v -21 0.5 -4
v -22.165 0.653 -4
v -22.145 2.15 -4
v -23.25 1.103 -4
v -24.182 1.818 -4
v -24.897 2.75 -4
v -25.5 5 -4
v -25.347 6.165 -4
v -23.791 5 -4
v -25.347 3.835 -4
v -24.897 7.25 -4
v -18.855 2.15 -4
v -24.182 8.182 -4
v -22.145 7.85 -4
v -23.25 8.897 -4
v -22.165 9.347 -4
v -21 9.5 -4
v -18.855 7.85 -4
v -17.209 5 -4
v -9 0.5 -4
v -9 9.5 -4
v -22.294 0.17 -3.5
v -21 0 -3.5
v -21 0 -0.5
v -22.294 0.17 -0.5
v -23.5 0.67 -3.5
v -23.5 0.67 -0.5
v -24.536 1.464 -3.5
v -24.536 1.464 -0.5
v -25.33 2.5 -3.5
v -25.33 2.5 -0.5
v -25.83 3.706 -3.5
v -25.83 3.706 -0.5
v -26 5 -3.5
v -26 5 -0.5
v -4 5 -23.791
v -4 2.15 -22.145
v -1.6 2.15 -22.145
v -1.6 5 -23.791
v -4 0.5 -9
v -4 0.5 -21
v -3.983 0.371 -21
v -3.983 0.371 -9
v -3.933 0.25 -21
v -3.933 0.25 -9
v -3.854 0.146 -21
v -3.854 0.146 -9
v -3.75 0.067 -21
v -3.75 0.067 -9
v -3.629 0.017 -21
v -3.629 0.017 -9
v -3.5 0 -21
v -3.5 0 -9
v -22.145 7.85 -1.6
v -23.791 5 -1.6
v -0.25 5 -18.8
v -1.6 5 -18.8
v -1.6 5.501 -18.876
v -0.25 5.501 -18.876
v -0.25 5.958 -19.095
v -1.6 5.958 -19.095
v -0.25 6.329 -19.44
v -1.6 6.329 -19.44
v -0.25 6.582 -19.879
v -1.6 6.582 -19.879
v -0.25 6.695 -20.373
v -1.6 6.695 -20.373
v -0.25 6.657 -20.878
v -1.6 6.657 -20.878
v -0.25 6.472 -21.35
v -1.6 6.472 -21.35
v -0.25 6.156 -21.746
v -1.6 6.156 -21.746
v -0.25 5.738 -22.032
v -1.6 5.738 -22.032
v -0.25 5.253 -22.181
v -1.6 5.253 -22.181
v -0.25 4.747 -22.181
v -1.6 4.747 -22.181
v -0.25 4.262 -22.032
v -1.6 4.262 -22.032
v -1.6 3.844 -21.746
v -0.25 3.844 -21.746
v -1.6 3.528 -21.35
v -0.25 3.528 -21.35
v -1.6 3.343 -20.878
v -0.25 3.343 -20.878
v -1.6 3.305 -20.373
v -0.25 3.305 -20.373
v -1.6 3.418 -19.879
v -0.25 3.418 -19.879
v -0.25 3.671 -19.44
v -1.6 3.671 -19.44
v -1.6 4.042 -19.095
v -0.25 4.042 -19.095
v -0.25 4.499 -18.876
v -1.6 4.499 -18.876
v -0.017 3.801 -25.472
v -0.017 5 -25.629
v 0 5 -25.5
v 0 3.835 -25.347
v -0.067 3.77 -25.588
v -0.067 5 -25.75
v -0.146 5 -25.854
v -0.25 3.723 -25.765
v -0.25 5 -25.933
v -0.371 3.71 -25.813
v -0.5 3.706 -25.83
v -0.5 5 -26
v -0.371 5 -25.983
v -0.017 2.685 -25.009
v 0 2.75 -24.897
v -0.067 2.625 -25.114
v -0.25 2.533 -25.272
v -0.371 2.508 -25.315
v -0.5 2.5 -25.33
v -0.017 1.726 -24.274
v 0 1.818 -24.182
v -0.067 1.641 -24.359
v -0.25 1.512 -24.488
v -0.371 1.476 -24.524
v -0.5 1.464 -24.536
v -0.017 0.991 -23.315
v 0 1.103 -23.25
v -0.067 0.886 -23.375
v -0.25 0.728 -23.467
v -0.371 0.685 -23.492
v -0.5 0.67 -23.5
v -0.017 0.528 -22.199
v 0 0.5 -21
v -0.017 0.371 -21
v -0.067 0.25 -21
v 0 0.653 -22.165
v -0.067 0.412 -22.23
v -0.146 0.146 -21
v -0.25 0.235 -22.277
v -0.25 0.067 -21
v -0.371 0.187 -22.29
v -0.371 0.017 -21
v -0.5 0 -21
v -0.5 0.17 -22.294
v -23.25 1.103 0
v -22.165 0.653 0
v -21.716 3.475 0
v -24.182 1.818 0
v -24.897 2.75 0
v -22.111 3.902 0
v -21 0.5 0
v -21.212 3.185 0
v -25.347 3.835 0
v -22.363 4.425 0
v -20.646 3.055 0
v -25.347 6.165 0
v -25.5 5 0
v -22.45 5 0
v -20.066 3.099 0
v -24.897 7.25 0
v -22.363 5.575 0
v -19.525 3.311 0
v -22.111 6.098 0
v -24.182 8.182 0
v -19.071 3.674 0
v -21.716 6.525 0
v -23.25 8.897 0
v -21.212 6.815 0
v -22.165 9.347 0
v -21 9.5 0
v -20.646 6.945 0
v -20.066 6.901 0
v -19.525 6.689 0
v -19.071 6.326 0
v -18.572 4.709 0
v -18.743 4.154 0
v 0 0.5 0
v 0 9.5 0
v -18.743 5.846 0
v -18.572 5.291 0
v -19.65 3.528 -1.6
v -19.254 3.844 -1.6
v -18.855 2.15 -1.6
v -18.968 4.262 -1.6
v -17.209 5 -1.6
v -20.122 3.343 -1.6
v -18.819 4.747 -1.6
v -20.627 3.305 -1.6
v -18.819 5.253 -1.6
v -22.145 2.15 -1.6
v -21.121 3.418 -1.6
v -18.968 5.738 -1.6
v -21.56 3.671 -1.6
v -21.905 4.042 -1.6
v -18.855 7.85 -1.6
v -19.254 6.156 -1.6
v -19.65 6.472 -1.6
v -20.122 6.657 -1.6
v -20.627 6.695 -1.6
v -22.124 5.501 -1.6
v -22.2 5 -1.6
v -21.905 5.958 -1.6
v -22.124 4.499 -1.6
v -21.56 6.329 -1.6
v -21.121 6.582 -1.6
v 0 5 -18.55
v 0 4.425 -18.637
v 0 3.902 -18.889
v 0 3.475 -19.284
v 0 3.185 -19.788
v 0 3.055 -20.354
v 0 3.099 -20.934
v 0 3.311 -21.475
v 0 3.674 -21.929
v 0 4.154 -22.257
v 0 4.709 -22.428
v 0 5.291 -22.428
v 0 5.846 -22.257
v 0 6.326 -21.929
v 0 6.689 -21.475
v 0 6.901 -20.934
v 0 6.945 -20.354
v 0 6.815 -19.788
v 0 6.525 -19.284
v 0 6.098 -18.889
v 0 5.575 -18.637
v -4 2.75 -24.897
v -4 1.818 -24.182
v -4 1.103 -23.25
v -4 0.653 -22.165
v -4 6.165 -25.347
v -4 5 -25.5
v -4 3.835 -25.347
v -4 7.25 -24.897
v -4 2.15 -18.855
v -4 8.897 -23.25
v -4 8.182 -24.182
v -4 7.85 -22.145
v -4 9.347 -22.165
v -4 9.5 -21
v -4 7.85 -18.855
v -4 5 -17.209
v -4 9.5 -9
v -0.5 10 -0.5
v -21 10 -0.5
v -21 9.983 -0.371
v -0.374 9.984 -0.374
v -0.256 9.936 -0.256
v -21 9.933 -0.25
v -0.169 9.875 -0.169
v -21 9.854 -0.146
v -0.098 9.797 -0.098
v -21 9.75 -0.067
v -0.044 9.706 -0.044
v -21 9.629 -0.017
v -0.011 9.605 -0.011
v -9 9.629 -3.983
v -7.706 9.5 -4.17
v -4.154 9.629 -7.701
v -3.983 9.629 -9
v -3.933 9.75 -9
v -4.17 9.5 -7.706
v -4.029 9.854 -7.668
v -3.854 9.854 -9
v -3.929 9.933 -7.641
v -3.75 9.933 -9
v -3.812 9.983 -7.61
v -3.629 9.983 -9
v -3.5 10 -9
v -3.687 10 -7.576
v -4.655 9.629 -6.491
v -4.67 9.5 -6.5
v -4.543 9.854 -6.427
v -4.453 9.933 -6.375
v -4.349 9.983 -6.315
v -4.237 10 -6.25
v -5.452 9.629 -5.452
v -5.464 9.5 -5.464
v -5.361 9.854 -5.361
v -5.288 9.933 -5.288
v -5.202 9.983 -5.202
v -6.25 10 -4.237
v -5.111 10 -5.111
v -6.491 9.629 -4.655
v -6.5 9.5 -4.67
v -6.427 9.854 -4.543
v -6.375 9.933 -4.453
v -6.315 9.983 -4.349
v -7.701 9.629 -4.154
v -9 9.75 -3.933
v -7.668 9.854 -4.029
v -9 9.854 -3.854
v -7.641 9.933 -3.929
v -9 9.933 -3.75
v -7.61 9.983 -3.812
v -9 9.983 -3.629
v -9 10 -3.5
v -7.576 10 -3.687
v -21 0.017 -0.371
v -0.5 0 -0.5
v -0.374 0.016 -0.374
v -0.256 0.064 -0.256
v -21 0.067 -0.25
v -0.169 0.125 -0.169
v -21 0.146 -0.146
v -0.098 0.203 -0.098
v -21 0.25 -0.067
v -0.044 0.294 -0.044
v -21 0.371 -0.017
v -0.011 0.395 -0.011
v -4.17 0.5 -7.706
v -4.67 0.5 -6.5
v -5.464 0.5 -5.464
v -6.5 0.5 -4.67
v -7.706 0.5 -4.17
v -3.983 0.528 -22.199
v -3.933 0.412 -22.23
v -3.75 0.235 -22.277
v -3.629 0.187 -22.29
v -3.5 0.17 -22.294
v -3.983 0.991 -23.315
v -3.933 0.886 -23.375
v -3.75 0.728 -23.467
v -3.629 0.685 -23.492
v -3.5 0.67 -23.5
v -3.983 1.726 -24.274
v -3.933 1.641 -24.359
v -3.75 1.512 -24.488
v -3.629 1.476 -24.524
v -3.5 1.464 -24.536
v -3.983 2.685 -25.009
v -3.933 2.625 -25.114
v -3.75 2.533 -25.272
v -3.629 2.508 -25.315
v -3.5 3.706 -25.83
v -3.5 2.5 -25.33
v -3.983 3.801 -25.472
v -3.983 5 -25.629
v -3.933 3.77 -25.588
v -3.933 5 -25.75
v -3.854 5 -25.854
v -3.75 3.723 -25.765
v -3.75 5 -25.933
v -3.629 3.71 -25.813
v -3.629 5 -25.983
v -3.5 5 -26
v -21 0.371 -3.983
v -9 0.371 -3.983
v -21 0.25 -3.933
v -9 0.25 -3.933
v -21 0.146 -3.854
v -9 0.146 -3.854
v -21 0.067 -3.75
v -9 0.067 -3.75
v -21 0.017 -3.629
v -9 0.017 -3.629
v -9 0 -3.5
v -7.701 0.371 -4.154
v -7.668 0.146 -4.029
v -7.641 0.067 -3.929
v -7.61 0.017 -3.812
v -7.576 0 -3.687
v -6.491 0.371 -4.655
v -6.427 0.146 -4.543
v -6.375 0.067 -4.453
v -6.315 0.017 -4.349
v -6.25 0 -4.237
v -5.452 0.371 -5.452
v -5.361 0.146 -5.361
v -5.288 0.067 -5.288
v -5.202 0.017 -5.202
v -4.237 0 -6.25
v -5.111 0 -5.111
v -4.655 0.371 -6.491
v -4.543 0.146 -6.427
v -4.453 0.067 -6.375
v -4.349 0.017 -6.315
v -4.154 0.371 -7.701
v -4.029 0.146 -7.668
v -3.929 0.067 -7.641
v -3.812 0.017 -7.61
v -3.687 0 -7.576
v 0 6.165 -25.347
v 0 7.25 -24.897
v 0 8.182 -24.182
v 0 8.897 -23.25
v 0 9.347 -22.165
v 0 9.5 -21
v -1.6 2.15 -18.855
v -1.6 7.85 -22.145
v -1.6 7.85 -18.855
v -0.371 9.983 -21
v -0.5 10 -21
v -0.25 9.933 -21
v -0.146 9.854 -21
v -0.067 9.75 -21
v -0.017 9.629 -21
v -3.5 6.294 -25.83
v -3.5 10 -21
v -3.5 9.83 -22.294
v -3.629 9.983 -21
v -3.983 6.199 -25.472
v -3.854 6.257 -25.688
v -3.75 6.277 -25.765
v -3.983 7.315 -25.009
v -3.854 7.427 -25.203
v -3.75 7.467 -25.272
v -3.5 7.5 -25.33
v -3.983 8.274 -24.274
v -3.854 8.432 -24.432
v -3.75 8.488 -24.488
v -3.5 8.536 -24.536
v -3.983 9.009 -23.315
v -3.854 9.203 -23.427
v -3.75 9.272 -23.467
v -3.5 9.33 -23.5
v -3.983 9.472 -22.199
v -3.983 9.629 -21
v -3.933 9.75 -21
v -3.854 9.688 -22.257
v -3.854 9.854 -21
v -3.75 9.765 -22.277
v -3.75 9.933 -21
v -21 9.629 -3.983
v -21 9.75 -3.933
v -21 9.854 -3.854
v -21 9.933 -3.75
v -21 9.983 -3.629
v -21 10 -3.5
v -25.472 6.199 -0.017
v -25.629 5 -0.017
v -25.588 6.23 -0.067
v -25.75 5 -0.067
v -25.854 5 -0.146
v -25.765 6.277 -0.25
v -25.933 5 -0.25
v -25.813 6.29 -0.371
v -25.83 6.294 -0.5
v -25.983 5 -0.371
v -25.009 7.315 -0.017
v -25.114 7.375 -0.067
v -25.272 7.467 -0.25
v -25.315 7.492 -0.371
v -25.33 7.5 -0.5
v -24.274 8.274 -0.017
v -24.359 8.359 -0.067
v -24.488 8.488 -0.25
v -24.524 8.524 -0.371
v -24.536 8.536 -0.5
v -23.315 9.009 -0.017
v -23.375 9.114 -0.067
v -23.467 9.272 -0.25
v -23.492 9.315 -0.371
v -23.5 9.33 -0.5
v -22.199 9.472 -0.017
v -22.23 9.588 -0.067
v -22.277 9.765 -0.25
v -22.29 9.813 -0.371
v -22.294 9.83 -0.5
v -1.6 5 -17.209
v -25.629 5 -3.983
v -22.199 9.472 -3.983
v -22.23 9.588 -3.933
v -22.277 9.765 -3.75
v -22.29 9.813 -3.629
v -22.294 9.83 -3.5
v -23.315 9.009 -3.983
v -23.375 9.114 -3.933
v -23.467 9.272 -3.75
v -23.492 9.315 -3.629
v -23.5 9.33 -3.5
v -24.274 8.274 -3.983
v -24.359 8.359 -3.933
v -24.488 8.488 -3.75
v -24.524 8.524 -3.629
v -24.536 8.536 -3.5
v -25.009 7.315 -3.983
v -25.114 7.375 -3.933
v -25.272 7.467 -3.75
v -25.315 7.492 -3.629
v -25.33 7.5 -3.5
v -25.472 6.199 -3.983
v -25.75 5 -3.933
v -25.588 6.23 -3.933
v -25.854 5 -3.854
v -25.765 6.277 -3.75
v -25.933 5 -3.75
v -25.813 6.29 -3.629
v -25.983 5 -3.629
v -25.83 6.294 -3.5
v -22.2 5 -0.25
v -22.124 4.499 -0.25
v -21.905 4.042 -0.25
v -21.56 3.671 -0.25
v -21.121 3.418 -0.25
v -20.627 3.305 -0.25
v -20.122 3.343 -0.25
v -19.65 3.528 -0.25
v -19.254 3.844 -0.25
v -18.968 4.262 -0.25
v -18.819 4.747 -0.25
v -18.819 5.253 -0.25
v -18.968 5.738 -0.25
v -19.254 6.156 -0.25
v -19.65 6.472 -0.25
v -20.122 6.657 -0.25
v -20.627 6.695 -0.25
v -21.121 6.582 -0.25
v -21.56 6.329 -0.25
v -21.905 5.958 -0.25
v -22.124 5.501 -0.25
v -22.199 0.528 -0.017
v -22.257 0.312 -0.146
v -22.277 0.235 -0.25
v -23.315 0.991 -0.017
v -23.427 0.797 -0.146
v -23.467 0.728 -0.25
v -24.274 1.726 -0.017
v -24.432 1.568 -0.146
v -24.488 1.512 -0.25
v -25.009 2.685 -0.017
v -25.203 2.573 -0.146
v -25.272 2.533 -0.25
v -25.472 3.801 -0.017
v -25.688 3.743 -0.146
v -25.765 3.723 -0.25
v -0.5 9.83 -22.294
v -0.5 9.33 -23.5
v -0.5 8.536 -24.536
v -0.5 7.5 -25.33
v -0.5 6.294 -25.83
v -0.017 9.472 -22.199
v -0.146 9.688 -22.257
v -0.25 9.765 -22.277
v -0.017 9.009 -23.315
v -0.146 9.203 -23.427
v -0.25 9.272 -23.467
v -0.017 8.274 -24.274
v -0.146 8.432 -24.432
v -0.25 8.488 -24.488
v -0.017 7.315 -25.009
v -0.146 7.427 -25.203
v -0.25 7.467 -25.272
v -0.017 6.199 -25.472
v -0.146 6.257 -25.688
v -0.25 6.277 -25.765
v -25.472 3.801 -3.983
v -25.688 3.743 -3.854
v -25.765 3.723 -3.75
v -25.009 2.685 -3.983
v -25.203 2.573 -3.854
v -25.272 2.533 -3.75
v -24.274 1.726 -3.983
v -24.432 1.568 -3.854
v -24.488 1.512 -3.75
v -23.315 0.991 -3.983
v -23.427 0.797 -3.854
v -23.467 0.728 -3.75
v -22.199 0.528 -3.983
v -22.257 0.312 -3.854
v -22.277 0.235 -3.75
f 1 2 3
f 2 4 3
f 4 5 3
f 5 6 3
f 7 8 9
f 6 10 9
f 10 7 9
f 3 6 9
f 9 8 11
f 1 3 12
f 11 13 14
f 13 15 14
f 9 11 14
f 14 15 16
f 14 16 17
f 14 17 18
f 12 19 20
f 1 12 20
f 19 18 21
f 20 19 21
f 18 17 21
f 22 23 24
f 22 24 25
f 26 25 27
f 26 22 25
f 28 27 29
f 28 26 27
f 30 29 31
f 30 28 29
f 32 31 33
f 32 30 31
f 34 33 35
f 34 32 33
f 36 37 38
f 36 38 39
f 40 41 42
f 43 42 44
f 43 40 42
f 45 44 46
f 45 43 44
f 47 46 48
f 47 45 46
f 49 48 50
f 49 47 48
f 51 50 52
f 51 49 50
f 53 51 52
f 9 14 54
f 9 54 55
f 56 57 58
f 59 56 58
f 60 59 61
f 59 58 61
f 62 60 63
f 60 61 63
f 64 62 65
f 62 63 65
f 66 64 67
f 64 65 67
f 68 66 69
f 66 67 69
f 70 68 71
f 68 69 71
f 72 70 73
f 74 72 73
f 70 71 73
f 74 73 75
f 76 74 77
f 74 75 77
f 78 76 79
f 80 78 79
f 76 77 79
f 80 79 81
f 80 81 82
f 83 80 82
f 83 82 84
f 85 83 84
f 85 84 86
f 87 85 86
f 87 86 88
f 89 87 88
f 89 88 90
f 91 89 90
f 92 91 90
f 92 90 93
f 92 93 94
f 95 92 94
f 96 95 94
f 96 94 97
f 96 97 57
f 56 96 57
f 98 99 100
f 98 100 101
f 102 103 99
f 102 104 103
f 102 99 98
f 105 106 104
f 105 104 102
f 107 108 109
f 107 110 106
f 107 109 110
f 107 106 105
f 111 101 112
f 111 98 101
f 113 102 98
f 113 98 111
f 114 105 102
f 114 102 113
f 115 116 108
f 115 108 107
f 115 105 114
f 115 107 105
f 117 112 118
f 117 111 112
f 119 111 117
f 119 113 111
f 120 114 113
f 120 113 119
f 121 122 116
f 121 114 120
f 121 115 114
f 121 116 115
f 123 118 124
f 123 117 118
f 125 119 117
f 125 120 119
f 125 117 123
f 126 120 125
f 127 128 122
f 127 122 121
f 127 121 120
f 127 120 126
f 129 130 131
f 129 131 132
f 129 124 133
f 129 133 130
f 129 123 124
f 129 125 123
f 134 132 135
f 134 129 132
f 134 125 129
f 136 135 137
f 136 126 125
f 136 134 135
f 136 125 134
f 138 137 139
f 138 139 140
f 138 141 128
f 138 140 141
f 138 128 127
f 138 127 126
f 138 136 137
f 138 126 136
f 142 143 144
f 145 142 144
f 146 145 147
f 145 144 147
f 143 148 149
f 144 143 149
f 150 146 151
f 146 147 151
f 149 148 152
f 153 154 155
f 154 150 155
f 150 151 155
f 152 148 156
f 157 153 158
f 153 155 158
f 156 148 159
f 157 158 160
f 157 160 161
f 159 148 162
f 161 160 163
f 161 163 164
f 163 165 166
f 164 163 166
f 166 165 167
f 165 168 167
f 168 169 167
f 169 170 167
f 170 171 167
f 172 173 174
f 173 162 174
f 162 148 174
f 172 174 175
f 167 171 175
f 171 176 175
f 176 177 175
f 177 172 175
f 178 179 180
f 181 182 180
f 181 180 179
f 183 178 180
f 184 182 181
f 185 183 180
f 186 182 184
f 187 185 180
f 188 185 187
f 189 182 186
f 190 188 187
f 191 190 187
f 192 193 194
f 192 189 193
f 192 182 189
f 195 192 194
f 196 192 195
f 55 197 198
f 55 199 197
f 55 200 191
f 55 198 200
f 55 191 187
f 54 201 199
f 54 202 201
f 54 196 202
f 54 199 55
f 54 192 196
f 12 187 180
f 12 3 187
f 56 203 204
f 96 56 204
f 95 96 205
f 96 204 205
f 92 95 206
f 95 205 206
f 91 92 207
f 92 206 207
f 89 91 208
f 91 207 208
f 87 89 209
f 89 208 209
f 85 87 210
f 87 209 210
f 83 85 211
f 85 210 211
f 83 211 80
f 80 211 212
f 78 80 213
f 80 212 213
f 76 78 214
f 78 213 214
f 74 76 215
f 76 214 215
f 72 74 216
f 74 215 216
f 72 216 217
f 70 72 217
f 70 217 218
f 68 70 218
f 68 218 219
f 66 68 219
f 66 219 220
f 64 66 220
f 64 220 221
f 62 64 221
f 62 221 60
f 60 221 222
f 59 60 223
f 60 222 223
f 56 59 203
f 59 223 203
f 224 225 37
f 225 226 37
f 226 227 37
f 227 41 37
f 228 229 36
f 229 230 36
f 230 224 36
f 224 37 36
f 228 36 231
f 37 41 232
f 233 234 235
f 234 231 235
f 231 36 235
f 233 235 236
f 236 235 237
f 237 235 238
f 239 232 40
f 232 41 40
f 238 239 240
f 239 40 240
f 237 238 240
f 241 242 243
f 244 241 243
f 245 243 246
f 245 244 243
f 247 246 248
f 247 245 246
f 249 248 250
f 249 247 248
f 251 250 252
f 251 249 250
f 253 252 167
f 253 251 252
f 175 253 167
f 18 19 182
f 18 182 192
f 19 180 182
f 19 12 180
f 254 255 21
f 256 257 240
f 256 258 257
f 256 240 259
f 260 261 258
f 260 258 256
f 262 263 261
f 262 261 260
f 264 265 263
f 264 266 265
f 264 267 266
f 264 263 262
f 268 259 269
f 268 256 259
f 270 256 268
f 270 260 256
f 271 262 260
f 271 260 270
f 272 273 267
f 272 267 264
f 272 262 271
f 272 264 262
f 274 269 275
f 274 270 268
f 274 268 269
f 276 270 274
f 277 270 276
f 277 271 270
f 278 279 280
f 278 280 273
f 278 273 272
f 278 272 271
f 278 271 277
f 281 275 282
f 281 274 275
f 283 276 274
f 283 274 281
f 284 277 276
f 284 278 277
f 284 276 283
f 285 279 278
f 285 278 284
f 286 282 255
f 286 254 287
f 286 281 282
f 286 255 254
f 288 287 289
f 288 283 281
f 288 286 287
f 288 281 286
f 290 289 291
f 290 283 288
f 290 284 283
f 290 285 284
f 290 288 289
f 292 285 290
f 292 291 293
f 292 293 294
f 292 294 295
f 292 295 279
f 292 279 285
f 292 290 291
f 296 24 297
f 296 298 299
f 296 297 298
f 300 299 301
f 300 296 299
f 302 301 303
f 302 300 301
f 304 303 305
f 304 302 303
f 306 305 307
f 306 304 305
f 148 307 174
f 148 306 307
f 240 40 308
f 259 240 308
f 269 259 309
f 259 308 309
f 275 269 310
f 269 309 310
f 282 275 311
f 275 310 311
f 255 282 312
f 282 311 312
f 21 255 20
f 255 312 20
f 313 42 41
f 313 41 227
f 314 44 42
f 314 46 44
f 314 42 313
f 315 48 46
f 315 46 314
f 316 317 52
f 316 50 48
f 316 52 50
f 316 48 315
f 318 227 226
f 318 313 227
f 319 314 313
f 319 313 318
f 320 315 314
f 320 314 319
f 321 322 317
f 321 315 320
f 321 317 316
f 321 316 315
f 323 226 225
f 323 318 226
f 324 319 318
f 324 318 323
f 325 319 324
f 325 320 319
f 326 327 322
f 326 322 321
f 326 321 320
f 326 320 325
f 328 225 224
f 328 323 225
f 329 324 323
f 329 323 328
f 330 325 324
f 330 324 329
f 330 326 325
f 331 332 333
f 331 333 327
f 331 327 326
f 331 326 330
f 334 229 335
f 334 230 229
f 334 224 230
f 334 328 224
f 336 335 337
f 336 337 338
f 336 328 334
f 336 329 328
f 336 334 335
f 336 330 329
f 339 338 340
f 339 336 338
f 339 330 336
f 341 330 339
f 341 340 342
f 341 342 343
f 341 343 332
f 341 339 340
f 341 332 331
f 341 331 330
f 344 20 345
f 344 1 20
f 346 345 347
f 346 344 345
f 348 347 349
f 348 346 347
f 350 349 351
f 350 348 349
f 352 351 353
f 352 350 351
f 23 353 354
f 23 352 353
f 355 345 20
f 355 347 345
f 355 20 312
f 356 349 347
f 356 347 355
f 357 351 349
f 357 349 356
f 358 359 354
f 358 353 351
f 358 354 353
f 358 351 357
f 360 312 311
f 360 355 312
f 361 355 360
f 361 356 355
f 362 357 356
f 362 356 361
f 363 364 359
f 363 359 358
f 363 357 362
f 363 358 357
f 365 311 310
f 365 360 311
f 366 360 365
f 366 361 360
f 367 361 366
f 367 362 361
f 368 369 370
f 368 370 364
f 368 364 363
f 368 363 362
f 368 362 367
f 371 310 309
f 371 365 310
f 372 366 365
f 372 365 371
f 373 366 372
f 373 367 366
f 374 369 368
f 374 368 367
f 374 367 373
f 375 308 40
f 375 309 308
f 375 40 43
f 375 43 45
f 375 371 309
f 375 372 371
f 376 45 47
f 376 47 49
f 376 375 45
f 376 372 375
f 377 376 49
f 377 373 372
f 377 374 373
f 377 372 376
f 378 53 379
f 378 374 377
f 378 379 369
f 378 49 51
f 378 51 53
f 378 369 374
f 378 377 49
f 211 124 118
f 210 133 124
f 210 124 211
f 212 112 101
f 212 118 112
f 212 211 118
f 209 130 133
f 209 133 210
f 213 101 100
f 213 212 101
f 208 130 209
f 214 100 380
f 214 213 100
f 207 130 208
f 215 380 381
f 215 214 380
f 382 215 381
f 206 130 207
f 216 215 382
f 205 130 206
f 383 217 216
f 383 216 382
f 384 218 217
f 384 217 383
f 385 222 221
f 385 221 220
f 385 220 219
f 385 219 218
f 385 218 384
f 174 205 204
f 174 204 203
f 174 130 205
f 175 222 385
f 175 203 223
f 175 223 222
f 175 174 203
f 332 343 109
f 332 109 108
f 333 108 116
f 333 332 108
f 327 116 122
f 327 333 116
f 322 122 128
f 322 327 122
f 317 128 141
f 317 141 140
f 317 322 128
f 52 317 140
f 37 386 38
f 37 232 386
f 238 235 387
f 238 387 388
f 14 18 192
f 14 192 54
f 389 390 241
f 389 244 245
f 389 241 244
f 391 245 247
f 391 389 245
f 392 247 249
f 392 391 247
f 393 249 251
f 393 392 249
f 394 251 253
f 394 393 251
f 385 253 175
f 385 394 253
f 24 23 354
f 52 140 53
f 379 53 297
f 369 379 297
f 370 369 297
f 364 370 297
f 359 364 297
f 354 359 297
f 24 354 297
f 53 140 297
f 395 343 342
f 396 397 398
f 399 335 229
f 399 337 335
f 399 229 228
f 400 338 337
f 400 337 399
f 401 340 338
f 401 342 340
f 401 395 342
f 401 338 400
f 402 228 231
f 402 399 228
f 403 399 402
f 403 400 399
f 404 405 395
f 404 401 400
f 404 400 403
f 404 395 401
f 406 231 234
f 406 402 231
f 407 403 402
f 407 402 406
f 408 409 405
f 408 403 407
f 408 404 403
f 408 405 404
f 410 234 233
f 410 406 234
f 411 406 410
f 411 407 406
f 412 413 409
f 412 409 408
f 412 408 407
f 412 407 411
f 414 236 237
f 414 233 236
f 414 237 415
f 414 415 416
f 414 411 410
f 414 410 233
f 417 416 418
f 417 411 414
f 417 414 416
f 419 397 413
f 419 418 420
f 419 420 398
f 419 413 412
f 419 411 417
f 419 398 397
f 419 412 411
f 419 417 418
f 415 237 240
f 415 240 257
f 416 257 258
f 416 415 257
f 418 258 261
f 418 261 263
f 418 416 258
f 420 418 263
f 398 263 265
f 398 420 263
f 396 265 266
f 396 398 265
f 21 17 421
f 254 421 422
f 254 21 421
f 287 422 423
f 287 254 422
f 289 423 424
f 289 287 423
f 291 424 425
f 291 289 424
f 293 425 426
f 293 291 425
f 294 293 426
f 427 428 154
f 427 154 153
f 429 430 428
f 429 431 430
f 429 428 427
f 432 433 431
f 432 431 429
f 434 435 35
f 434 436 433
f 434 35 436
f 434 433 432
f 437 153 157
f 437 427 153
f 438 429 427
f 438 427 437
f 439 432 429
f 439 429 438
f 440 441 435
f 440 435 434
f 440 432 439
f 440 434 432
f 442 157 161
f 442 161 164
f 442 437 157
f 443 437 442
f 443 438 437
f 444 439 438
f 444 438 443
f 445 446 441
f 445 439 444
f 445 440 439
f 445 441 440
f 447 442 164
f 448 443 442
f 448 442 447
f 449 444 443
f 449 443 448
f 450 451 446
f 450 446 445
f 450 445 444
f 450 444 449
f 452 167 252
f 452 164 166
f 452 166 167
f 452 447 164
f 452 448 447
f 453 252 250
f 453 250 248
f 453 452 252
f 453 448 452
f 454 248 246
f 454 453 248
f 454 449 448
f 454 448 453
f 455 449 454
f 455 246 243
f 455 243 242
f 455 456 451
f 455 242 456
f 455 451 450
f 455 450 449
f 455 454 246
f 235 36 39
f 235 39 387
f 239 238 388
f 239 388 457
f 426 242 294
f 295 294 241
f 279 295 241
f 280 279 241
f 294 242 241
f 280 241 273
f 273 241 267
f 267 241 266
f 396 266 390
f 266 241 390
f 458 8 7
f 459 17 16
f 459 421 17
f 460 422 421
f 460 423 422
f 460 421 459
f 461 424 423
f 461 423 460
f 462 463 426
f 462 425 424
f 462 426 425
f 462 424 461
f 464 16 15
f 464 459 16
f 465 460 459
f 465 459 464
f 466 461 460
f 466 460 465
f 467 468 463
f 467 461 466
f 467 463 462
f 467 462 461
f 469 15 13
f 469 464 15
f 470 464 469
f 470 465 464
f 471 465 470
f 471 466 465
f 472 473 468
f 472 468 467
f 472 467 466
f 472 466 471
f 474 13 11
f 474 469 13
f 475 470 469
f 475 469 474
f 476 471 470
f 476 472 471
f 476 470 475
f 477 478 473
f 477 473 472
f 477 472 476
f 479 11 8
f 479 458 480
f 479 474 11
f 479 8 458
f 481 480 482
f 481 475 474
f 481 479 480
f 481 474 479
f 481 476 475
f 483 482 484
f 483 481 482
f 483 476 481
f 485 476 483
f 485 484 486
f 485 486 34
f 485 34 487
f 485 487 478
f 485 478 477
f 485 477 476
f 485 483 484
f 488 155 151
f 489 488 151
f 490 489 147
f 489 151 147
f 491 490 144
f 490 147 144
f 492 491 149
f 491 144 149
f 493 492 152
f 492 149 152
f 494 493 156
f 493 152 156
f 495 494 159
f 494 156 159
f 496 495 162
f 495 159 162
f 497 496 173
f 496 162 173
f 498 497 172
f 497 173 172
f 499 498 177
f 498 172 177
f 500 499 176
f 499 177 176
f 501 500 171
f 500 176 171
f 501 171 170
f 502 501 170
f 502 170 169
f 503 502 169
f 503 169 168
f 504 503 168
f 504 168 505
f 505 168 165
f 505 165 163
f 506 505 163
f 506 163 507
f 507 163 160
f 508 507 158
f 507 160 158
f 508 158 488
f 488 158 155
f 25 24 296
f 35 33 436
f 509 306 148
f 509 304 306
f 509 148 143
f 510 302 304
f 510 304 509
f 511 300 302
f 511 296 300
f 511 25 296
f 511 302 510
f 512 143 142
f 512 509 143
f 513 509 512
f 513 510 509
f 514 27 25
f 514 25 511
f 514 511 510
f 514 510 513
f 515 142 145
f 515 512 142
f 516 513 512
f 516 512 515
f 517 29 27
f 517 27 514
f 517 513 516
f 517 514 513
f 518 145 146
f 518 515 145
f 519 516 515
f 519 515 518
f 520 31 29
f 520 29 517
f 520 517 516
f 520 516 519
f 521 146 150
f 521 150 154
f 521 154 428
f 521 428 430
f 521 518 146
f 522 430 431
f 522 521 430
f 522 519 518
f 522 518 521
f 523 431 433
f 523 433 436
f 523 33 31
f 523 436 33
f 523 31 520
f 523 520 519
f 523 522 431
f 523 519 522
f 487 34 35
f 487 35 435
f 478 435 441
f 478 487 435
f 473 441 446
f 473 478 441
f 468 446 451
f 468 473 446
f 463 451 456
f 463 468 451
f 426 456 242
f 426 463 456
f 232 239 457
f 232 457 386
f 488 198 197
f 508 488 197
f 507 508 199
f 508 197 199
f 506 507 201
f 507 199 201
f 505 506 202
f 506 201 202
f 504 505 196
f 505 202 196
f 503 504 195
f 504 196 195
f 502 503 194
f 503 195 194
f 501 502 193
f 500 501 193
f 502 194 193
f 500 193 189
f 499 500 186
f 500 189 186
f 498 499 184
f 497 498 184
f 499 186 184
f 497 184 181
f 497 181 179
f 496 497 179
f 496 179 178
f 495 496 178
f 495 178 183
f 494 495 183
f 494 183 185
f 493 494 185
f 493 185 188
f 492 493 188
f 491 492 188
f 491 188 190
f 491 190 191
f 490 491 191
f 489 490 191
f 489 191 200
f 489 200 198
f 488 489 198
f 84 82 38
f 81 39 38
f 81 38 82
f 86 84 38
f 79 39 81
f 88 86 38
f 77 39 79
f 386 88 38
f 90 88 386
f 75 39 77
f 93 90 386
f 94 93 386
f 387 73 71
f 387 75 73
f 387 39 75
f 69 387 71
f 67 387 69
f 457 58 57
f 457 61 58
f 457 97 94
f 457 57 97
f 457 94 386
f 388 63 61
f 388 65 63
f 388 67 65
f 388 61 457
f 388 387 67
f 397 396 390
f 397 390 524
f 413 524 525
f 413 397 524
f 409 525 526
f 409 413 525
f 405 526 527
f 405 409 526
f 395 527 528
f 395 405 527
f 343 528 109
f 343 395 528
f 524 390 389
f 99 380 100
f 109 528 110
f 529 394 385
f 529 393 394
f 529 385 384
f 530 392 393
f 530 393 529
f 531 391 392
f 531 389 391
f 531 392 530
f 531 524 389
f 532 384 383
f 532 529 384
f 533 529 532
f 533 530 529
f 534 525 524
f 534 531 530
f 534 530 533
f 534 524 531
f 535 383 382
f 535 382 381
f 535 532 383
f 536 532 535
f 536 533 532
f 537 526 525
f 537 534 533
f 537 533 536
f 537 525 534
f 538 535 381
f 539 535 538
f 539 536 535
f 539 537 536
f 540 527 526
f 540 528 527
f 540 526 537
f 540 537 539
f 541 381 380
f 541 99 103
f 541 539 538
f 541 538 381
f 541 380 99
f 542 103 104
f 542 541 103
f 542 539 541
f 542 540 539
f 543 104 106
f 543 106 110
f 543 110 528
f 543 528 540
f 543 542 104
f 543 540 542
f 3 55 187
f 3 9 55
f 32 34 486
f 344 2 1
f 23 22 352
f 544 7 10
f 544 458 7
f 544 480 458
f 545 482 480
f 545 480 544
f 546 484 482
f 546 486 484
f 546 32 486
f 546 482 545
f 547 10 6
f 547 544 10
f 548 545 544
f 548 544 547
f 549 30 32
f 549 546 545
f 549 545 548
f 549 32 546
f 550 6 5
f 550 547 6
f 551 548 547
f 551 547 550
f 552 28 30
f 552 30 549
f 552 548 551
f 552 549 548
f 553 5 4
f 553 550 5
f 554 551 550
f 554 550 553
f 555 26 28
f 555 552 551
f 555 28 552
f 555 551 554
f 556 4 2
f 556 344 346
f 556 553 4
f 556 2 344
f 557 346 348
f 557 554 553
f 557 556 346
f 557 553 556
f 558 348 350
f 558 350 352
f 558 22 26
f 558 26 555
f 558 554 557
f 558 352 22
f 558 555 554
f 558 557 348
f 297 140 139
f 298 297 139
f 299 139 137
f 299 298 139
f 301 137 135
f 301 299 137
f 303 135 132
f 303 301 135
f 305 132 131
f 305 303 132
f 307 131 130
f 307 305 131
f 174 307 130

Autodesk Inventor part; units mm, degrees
ref_plane "YZ Plane" through (0, 0, 0) normal (1, 0, 0) x (0, 1, 0)
ref_plane "XZ Plane" through (0, 0, 0) normal (0, 1, 0) x (-1, 0, 0)
ref_plane "XY Plane" through (0, 0, 0) normal (0, 0, 1) x (1, 0, 0)
sketch "Sketch1" plane through (0, 0, 0) normal (1, 0, 0) x (0, 1, 0)
  line L0 (0, 0) -> (10, 0)
  line L1 (10, 0) -> (10, -26)
  line L2 (10, -26) -> (0, -26)
  line L3 (0, -26) -> (0, 0)
  dimension "d0" = 10
  dimension "d1" = 26
extrude "Extrusion1" add sketch "Sketch1" against normal blind 4
sketch "Sketch2" plane through (0, 0, 0) normal (0, 0, 1) x (1, 0, 0)
  line L0 (0, 0) -> (-4, 0) projected
  line L1 (0, 0) -> (-26, 0)
  line L2 (-26, 0) -> (-26, 10)
  line L3 (-26, 10) -> (0, 10)
  line L4 (0, 10) -> (0, 0)
  line L5 (0, 10) -> (0, 0) projected
  point P0 (-4, 0)
  dimension "d4" = 26
extrude "Extrusion2" add sketch "Sketch2" against normal blind 4
sketch "Sketch3" plane through (-4, 0, 0) normal (-1, 0, 0) x (0, 0, 1)
  line L0 (-18.8546, 2.15) -> (-22.1454, 2.15)
  line L1 (-22.1454, 2.15) -> (-23.7909, 5)
  line L2 (-23.7909, 5) -> (-22.1454, 7.85)
  line L3 (-22.1454, 7.85) -> (-18.8546, 7.85)
  line L4 (-18.8546, 7.85) -> (-17.2091, 5)
  line L5 (-17.2091, 5) -> (-18.8546, 2.15)
  line L6 (-26, 10) -> (-26, 0) projected
  point P0 (0, 0)
  point P1 (-20.5, 5)
  point P2 (-26, 5)
  dimension "d7" = 5.7
  dimension "d8" = 5.5
extrude "Extrusion3" cut sketch "Sketch3" against normal blind 2.4
sketch "Sketch4" plane through (-1.6, 0, 0) normal (-1, 0, 0) x (0, 0, 1)
  line L0 (-18.8546, 7.85) -> (-17.2091, 5) projected
  line L1 (-22.1454, 7.85) -> (-18.8546, 7.85) projected
  line L2 (-23.7909, 5) -> (-22.1454, 7.85) projected
  line L3 (-22.1454, 2.15) -> (-23.7909, 5) projected
  line L4 (-18.8546, 2.15) -> (-22.1454, 2.15) projected
  line L5 (-17.2091, 5) -> (-18.8546, 2.15) projected
  circle A0 centre (-20.5, 5) radius 1.7
  point P0 (0, 0)
  dimension "d11" = 3.4
extrude "Extrusion4" cut sketch "Sketch4" against normal up to surface (1.6 mm away) contours A0
sketch "Sketch5" plane through (0, 0, -4) normal (0, 0, -1) x (-1, 0, 0)
  line L0 (22.1454, 2.15) -> (18.8546, 2.15)
  line L1 (18.8546, 2.15) -> (17.2091, 5)
  line L2 (17.2091, 5) -> (18.8546, 7.85)
  line L3 (18.8546, 7.85) -> (22.1454, 7.85)
  line L4 (22.1454, 7.85) -> (23.7909, 5)
  line L5 (23.7909, 5) -> (22.1454, 2.15)
  line L6 (26, 0) -> (26, 10) projected
  point P0 (0, 0)
  point P1 (20.5, 5)
  point P2 (26, 5)
  dimension "d14" = 5.7
  dimension "d15" = 5.5
extrude "Extrusion5" cut sketch "Sketch5" against normal blind 2.4
sketch "Sketch6" plane through (0, 0, -1.6) normal (0, 0, -1) x (-1, 0, 0)
  circle A0 centre (20.5, 5) radius 1.7
  point P0 (0, 0)
  dimension "d18" = 3.4
extrude "Extrusion6" cut sketch "Sketch6" against normal up to surface (1.6 mm away)
fillet "Fillet1" radius 5 4 edges at (-2, 10, -26) (-2, 0, -26) (-26, 10, -2) (-26, 0, -2)
fillet "Fillet2" radius 5 1 edges at (-4, 5, -4)
fillet "Fillet3" radius 0.5 13 edges at (-4, 10, -15.0003) (-4, 8.5357, -24.5357) (-4, 0, -15.0003) (-5.4645, 0, -5.4645) (-24.5357, 8.5357, -4) (-15.0002, 10, -4) (-5.4645, 10, -5.4645) (0, 8.5357, -24.5357) (0, 0, -10.5003) (0, 10, -10.5003) (-24.5357, 8.5357, 0) (-10.5002, 0, 0) (-10.5002, 10, 0)
chamfer "Chamfer1" distance 0.25 angle 45 2 edges at (0, 5, -22.2) (-18.8, 5, 0)
properties part number "BoxBracket"
